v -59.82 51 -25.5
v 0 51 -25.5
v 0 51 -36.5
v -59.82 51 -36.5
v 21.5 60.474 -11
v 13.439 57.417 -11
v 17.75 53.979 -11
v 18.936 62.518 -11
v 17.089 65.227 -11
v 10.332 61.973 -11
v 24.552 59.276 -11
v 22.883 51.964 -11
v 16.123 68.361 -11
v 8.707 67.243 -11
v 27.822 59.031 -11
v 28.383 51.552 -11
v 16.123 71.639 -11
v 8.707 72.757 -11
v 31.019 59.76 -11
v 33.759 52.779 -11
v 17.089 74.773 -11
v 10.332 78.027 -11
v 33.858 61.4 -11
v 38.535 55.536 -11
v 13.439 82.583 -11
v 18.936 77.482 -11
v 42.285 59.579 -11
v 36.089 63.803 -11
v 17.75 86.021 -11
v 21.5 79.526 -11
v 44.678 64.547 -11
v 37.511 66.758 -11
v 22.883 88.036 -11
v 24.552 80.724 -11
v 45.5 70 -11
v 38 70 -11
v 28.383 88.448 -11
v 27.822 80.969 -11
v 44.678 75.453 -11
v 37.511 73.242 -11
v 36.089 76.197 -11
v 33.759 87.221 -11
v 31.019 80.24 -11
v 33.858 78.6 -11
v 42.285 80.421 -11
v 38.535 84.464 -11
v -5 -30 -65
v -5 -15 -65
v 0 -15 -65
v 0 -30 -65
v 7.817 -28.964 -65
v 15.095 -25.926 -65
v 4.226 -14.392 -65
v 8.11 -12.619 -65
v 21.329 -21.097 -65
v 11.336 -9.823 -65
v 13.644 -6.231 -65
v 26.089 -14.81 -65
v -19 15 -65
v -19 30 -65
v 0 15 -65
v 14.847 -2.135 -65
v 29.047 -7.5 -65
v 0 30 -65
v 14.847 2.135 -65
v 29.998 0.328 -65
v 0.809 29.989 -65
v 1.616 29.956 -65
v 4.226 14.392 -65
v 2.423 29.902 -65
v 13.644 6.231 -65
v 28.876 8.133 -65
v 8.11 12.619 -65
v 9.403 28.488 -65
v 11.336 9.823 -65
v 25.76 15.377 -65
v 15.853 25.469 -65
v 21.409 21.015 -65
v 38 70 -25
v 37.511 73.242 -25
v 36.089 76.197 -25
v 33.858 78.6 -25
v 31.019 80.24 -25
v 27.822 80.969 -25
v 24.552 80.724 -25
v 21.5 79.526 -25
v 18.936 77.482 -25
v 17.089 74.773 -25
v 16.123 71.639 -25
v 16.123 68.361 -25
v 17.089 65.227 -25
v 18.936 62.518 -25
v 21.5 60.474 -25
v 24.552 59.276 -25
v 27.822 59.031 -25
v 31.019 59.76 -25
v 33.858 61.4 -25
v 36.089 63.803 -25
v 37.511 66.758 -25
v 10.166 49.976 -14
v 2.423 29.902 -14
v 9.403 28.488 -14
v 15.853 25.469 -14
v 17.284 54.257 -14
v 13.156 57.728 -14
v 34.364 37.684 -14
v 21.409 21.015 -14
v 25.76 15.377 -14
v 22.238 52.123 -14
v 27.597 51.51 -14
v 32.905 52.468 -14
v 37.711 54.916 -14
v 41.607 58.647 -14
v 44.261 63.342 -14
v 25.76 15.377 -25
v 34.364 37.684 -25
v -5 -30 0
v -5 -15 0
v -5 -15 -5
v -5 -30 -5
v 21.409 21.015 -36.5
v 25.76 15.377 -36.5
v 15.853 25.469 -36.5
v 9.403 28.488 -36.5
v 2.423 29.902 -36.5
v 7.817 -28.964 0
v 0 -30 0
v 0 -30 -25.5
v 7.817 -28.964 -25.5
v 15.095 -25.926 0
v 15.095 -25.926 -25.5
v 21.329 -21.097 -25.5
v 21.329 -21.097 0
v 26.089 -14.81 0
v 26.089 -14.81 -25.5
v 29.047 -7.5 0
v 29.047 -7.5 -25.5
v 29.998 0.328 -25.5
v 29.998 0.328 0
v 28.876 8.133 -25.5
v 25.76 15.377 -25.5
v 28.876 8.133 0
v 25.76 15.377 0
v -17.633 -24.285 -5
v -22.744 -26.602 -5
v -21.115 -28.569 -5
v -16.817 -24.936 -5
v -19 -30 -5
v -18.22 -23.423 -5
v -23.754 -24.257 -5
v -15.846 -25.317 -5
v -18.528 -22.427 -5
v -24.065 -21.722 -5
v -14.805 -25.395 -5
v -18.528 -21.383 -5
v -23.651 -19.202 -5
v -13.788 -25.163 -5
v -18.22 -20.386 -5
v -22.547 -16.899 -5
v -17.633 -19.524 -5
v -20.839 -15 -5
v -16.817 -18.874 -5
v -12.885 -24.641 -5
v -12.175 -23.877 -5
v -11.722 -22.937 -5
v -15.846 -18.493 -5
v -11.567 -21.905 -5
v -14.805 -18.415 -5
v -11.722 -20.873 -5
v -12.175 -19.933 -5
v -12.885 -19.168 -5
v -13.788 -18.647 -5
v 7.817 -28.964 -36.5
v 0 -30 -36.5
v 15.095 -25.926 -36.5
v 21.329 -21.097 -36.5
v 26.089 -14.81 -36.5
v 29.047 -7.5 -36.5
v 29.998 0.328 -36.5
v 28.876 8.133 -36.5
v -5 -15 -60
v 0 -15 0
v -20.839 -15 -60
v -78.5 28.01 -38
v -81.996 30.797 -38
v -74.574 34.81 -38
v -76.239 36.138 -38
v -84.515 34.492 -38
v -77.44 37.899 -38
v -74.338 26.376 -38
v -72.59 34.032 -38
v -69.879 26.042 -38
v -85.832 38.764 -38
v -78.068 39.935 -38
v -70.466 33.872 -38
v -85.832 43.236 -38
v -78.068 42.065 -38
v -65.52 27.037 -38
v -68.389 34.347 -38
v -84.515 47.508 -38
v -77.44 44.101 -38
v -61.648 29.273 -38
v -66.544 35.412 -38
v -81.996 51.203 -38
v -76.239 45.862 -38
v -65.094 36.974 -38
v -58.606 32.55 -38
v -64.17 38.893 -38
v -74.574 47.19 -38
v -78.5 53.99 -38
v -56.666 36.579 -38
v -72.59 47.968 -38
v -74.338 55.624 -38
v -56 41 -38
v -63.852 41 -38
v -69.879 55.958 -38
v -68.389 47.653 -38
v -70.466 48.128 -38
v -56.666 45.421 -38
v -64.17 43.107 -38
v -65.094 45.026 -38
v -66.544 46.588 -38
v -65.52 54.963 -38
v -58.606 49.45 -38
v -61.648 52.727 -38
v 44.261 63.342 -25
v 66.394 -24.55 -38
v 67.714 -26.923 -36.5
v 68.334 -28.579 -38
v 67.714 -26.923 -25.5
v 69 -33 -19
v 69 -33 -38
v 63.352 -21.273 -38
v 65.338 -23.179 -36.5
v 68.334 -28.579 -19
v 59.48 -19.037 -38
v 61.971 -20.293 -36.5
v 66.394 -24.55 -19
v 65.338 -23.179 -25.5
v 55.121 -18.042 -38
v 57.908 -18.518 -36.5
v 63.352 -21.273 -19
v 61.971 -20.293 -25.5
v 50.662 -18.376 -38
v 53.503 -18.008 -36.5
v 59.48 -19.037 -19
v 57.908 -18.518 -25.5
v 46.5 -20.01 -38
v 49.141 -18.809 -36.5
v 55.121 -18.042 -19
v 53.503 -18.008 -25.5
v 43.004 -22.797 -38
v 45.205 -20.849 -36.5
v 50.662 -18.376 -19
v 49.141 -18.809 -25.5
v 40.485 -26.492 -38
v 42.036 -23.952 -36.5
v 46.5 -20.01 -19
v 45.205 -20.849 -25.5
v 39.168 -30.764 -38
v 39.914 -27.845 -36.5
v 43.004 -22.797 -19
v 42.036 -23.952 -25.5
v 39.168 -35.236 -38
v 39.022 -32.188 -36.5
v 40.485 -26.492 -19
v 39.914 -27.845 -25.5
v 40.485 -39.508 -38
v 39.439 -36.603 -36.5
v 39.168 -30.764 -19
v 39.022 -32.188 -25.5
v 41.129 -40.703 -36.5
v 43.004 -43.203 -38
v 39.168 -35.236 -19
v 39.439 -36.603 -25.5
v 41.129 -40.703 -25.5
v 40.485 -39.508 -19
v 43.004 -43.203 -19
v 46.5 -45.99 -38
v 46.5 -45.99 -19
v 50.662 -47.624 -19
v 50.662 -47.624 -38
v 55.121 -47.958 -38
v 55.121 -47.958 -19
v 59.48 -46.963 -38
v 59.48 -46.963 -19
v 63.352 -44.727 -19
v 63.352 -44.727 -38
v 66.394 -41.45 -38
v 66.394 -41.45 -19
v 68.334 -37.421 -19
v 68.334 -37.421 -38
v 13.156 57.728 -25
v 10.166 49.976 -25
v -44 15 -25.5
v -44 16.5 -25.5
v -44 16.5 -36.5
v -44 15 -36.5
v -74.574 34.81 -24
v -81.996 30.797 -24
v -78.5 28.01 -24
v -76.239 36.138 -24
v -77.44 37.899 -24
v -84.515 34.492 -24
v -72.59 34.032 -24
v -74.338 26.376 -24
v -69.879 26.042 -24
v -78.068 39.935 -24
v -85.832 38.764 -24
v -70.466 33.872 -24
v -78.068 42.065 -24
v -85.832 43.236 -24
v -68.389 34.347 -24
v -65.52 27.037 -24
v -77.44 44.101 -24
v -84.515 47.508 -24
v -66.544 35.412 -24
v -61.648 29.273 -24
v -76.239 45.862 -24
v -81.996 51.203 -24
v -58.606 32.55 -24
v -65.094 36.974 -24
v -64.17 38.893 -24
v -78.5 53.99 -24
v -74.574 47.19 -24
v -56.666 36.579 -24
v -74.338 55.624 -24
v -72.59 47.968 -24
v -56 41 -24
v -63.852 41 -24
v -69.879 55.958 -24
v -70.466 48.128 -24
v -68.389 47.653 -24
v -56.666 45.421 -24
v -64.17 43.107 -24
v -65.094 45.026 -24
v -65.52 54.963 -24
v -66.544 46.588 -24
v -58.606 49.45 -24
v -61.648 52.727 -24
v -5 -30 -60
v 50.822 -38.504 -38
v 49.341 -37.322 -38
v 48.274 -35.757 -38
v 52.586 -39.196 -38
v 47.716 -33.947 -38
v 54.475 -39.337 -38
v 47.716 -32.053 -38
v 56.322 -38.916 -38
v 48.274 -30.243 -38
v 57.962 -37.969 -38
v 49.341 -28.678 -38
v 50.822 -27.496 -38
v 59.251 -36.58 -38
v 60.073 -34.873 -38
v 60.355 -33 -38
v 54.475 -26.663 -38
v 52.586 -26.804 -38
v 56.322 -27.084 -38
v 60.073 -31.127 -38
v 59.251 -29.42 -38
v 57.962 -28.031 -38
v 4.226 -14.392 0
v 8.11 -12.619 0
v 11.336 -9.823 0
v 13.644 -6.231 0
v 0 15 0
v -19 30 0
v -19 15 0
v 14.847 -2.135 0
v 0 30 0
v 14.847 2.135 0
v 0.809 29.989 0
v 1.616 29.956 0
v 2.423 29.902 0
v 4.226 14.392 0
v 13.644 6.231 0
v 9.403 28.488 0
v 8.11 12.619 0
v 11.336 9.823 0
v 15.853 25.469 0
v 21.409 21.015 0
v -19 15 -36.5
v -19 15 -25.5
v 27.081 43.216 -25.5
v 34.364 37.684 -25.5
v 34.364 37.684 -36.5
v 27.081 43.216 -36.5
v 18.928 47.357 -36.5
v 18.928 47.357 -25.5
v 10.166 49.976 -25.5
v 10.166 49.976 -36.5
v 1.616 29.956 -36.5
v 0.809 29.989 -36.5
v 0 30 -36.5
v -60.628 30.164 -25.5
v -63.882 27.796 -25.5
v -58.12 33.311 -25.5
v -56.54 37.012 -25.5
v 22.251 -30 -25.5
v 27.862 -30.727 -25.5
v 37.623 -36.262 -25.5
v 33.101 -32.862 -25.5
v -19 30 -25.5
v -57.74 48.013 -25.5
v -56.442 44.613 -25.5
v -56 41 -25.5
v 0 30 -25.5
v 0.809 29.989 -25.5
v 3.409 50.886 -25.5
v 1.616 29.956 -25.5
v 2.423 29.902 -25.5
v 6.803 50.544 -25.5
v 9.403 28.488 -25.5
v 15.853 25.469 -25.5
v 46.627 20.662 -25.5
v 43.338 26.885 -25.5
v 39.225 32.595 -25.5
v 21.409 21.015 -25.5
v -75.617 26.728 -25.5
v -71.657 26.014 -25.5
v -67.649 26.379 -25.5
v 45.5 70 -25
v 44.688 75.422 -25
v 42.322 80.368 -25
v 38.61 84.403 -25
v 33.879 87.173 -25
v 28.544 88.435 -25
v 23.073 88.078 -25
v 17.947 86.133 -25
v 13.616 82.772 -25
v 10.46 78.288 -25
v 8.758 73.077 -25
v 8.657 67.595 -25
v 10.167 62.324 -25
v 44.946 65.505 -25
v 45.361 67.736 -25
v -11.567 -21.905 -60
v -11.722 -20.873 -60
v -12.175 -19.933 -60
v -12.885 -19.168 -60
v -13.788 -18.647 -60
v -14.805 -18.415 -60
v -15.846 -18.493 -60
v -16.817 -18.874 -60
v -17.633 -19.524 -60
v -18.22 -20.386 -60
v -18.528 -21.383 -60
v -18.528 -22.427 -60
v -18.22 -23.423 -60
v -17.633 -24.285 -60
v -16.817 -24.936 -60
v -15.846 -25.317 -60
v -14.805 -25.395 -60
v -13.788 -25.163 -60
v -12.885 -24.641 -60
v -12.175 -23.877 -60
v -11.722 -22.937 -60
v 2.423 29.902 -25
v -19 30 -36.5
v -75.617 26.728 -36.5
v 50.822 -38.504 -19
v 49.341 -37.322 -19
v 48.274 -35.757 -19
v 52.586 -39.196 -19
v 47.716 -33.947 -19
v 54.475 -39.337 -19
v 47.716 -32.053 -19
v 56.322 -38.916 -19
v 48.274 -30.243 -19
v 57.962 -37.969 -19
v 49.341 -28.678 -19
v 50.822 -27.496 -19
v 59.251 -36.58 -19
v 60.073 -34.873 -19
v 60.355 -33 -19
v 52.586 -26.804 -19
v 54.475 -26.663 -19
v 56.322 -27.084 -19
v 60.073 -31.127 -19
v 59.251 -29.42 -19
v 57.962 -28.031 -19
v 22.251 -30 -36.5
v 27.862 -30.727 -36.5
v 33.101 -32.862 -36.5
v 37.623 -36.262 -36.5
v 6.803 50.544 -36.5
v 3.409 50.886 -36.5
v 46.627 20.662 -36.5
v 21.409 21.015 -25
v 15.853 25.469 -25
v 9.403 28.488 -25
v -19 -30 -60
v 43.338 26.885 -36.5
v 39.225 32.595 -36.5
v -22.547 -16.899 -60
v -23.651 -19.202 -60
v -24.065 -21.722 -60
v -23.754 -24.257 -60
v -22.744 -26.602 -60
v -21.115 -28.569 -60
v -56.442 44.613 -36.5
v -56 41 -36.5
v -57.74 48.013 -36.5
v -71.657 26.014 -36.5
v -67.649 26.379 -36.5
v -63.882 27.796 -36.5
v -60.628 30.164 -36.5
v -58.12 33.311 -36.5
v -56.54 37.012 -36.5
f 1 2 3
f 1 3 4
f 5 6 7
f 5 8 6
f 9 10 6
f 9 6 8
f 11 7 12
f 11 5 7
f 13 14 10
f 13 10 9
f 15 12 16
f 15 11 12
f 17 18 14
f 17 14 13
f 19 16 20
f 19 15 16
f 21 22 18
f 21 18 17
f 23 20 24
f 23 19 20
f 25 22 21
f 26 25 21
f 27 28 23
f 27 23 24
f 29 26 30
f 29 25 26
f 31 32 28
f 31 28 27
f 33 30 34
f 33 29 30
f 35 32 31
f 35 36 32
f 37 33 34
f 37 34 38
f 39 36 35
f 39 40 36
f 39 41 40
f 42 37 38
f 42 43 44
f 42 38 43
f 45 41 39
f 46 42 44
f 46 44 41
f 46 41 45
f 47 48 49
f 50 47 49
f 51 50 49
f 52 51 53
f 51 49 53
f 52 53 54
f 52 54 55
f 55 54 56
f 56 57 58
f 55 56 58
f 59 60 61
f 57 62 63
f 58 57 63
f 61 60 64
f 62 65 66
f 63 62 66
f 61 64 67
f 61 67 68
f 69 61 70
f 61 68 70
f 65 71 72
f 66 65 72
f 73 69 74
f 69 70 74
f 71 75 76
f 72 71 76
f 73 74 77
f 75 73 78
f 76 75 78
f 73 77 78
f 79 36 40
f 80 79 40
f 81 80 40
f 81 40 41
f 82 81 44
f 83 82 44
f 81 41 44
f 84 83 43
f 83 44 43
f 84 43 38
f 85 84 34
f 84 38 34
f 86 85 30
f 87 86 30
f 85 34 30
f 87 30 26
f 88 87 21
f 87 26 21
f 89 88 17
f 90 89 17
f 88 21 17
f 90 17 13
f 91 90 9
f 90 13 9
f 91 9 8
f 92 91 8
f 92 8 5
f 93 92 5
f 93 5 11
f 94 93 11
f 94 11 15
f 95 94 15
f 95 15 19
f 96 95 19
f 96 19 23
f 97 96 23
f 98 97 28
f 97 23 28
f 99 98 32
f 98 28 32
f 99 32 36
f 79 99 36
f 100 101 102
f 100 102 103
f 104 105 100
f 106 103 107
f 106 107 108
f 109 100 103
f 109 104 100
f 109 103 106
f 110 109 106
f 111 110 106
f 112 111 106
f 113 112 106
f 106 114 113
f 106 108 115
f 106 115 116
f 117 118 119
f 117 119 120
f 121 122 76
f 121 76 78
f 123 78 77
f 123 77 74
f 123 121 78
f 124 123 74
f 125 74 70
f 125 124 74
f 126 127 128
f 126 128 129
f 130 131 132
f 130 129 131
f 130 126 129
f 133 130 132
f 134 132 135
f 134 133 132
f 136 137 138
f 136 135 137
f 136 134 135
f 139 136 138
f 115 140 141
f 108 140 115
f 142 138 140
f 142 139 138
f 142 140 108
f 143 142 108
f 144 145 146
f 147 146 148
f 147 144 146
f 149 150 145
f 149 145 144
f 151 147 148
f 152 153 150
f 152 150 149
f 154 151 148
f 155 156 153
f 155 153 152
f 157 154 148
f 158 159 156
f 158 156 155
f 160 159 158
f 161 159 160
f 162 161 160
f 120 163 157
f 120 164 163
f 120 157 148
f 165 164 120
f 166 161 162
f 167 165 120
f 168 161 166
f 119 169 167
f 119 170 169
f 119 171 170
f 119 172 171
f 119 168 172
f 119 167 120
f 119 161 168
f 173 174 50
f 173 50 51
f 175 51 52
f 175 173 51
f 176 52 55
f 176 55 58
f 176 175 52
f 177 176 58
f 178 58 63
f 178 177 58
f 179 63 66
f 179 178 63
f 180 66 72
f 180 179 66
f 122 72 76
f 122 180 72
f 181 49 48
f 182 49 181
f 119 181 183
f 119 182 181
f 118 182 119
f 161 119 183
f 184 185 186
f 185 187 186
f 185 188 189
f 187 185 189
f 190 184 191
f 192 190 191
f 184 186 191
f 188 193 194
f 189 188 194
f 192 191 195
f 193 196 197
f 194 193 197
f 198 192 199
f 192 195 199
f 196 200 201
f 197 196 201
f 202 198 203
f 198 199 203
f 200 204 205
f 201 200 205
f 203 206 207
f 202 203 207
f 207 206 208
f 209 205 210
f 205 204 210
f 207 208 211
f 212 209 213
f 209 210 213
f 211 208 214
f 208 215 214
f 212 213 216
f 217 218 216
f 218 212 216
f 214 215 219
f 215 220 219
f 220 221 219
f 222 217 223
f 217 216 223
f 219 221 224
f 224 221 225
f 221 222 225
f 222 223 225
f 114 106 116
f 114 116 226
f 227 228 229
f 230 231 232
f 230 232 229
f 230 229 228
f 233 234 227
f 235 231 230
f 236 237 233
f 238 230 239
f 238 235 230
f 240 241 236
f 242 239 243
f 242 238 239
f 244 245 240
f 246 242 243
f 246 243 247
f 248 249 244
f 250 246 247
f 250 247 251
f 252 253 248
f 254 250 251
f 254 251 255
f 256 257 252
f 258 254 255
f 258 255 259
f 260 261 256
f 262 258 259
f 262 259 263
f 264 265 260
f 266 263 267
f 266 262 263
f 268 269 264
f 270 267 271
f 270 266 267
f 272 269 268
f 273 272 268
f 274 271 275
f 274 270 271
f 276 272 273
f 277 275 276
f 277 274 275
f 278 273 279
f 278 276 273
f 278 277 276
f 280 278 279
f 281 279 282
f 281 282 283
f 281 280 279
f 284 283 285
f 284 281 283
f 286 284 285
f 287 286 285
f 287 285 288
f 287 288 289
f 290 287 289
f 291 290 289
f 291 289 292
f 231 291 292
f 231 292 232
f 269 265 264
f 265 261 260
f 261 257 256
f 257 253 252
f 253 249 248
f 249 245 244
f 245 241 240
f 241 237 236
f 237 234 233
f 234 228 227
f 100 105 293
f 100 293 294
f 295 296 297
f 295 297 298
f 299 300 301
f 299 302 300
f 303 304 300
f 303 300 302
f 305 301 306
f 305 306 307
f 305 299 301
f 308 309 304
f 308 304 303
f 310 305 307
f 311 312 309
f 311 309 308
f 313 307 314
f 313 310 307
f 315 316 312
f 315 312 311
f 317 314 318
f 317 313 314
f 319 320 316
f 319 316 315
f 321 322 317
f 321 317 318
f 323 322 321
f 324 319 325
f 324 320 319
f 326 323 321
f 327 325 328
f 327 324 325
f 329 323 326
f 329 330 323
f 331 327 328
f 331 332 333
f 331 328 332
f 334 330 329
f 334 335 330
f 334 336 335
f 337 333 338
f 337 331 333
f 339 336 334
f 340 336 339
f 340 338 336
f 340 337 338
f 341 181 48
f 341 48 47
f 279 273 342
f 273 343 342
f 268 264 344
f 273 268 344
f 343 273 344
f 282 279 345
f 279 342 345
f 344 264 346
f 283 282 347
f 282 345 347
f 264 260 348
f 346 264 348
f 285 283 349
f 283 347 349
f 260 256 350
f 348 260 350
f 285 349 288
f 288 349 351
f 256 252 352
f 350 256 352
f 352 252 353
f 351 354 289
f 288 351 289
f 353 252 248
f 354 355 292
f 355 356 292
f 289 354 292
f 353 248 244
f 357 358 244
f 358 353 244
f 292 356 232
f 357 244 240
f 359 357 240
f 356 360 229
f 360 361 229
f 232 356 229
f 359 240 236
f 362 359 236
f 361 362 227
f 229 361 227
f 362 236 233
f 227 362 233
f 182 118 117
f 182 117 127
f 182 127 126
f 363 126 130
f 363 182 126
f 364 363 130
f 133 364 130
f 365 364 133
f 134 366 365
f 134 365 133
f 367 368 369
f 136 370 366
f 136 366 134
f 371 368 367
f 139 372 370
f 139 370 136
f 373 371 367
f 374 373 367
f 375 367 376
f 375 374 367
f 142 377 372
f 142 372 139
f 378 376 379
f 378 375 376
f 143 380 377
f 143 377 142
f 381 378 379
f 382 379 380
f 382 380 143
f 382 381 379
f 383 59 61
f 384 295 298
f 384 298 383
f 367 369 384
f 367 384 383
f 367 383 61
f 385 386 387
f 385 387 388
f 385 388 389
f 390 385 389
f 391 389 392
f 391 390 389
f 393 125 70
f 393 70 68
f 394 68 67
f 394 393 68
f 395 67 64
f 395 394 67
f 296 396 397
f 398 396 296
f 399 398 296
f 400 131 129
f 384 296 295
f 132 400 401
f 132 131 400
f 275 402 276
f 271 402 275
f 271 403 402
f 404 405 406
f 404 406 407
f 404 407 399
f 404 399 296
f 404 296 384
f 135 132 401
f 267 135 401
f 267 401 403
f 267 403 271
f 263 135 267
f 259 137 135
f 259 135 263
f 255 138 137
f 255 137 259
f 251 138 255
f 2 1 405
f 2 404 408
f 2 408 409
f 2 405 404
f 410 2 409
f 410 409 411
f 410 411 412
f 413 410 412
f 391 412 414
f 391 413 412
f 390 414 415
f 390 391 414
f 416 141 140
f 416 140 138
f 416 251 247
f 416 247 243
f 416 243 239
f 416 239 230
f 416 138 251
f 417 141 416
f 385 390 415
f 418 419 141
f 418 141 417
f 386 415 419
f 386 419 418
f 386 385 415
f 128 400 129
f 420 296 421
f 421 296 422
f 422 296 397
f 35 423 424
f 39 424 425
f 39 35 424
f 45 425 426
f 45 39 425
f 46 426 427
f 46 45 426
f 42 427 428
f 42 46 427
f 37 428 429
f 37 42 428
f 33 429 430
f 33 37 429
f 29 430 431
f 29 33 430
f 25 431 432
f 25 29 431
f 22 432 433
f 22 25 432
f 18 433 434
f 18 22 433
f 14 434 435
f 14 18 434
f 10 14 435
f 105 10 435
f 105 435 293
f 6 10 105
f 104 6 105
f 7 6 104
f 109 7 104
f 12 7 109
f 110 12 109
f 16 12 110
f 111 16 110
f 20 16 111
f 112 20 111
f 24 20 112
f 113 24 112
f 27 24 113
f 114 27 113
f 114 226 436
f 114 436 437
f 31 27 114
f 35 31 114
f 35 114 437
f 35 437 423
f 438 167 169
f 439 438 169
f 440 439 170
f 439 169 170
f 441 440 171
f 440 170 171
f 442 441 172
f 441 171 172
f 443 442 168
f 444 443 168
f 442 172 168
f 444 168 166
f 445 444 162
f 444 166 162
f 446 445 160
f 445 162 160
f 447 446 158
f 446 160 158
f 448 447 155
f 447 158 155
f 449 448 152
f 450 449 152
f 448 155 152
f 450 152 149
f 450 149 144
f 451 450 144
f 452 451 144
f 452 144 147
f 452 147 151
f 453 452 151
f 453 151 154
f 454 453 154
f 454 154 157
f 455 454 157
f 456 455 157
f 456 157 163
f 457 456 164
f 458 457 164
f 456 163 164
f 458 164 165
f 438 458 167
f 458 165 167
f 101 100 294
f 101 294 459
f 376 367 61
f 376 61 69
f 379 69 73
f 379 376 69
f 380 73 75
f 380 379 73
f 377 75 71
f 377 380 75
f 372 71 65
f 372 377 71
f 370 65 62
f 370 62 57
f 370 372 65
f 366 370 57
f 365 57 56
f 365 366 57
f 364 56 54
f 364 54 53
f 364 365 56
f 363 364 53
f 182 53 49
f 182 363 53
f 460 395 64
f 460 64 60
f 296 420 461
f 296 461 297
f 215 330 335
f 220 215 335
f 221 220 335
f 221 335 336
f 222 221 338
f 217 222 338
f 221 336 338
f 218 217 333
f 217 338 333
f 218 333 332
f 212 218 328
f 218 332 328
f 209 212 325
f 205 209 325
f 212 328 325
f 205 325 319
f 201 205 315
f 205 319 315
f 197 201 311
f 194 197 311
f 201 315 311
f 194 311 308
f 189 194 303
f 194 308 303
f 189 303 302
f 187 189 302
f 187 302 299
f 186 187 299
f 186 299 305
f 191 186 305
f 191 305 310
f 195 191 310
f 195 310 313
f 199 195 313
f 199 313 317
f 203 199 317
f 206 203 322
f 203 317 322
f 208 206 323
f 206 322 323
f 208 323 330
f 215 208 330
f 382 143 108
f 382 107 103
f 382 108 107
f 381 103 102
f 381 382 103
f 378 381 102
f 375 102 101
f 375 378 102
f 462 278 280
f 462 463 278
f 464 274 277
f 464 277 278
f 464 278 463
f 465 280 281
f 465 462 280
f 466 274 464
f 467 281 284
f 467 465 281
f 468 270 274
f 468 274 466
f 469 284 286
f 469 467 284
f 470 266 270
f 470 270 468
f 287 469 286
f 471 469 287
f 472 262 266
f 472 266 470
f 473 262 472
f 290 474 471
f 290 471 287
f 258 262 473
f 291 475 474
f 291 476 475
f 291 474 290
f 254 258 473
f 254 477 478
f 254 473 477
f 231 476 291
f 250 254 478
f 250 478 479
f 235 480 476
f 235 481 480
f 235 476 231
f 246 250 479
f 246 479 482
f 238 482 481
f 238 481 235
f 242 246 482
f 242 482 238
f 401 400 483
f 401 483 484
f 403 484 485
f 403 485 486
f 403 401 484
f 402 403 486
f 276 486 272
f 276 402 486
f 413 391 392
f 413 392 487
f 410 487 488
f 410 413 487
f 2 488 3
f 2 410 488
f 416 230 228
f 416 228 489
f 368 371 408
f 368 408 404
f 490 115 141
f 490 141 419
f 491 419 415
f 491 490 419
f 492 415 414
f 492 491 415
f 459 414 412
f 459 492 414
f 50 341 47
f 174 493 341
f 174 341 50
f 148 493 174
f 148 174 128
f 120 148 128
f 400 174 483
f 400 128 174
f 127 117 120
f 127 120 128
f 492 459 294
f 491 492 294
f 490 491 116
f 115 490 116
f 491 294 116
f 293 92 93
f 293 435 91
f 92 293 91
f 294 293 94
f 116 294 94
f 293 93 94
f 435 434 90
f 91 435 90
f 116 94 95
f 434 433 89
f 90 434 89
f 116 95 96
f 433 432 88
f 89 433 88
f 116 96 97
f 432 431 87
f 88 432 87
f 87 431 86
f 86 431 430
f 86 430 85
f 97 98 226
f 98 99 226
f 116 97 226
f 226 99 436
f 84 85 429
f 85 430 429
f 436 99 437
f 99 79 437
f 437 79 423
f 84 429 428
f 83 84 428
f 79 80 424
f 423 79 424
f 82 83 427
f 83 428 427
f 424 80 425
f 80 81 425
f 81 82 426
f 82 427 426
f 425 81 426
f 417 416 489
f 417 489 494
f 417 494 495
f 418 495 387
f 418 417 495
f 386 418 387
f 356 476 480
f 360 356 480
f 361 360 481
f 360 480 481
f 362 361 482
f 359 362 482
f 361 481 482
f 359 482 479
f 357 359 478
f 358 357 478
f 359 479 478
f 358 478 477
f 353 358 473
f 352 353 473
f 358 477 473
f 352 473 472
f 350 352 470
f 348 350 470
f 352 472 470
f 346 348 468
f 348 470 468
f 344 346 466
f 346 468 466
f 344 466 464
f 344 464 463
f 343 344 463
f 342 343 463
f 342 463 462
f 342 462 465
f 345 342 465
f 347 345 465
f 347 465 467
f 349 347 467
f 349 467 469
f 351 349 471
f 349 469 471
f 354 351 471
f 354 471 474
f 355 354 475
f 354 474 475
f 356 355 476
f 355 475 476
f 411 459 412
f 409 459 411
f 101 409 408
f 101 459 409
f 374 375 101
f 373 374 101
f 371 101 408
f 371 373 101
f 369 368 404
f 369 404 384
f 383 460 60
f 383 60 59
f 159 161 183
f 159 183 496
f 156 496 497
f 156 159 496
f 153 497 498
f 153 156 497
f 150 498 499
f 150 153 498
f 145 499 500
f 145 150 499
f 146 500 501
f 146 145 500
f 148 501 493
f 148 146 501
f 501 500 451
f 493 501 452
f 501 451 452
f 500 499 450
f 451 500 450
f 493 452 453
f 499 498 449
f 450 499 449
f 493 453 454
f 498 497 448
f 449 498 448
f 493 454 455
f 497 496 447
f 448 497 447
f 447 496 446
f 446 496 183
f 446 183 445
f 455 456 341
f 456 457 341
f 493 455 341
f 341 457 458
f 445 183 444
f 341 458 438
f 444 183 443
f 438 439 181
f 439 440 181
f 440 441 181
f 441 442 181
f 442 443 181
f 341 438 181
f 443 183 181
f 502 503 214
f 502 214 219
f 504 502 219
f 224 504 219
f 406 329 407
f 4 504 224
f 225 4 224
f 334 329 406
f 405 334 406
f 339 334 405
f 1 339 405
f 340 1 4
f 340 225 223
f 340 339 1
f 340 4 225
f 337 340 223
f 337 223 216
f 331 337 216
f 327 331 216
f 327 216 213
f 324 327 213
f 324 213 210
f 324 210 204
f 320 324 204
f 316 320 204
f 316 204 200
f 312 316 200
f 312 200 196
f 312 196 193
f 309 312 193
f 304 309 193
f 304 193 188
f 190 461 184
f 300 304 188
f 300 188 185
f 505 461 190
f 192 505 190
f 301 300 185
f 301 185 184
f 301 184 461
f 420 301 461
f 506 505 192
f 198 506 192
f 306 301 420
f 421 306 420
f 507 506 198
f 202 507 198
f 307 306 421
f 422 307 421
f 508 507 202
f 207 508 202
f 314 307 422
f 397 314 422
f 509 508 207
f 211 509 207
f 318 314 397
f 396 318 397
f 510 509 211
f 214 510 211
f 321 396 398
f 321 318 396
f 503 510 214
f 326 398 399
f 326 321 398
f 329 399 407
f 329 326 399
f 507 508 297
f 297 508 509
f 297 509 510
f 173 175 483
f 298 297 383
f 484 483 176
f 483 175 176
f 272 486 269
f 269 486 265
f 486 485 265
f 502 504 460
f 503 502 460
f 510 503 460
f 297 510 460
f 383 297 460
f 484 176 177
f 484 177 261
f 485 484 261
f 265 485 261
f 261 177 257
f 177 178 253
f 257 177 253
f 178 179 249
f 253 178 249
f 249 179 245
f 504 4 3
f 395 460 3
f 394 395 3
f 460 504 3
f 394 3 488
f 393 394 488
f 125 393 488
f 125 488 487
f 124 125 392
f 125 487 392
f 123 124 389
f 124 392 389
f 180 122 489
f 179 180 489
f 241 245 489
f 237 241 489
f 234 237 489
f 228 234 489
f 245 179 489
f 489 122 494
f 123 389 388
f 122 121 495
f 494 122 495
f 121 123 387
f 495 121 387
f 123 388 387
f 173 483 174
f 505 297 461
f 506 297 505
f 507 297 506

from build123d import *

# Parameters (mm, degrees)
BOSS_EXTRUDE1_DEPTH = 65
BOSS_EXTRUDE2_START = -11
SKETCH1_4_R         = 11
BOSS_EXTRUDE2_DEPTH = 14
BOSS_EXTRUDE3_START = -19
SKETCH1_5_R         = 6.355
BOSS_EXTRUDE3_DEPTH = 19
BOSS_EXTRUDE4_START = -24
SKETCH1_6_R         = 7.1475
BOSS_EXTRUDE4_DEPTH = 14
BOSS_EXTRUDE5_START = -25.5
BOSS_EXTRUDE5_DEPTH = 11
BOSS_EXTRUDE6_START = -25.5
BOSS_EXTRUDE6_DEPTH = 11
BOSS_EXTRUDE8_START = -14
BOSS_EXTRUDE8_DEPTH = 11
BOSS_EXTRUDE9_START = -5
SKETCH1_11_R        = 3.5
BOSS_EXTRUDE9_DEPTH = 55


with BuildPart() as part:
    # Sketch1 → Boss-Extrude1 (new body)
    with BuildSketch(Plane.XY):
        with BuildLine():
            ThreePointArc((2.423237338, 29.901971855), (1.212609656, 29.975482946), (0, 30))
            Line((0, 30), (-19, 30))
            Line((-19, 30), (-19, 15))
            Line((-19, 15), (0, 15))
            ThreePointArc((0, 15), (15, 0), (0, -15))
            Line((0, -15), (-5, -15))
            Line((-5, -15), (-5, -30))
            Line((-5, -30), (0, -30))
            ThreePointArc((0, -30), (26.089312829, -14.810393516), (25.759532638, 15.376816259))
            ThreePointArc((25.759532638, 15.376816259), (15.852828365, 25.469350852), (2.423237338, 29.901971855))
        make_face()
    extrude(amount=-BOSS_EXTRUDE1_DEPTH)



with BuildPart() as body_2:
    # Sketch1<4> → Boss-Extrude2 (new body)
    with BuildSketch(Plane.XY.offset(BOSS_EXTRUDE2_START)):
        with BuildLine():
            ThreePointArc((45.5, 70), (20.437248607, 87.29682902), (13.156184416, 57.728130946))
            ThreePointArc((13.156184416, 57.728130946), (30.286091355, 51.794187642), (44.26053068, 63.342366738))
            ThreePointArc((44.26053068, 63.342366738), (45.187493197, 66.61398594), (45.5, 70))
        make_face()
        with Locations((27, 70)):
            Circle(SKETCH1_4_R, mode=Mode.SUBTRACT)
    extrude(amount=-BOSS_EXTRUDE2_DEPTH)


with BuildPart() as body_3:
    # Sketch1<5> → Boss-Extrude3 (new body)
    with BuildSketch(Plane.XY.offset(BOSS_EXTRUDE3_START)):
        with BuildLine():
            ThreePointArc((69, -33), (68.674928752, -29.894123935), (67.713804516, -26.922865338))
            ThreePointArc((67.713804516, -26.922865338), (47.097213206, -19.682660383), (41.128777406, -40.702702703))
            ThreePointArc((41.128777406, -40.702702703), (57.995726535, -47.458014022), (69, -33))
        make_face()
        with Locations((54, -33)):
            Circle(SKETCH1_5_R, mode=Mode.SUBTRACT)
    extrude(amount=-BOSS_EXTRUDE3_DEPTH)


with BuildPart() as body_4:
    # Sketch1<6> → Boss-Extrude4 (new body)
    with BuildSketch(Plane.XY.offset(BOSS_EXTRUDE4_START)):
        with BuildLine():
            ThreePointArc((-56, 41), (-56.987414616, 46.352331347), (-59.819660113, 51))
            ThreePointArc((-59.819660113, 51), (-83.571760681, 49.182348891), (-75.616979166, 26.728227041))
            ThreePointArc((-75.616979166, 26.728227041), (-62.175451499, 28.870393916), (-56, 41))
        make_face()
        with Locations((-71, 41)):
            Circle(SKETCH1_6_R, mode=Mode.SUBTRACT)
    extrude(amount=-BOSS_EXTRUDE4_DEPTH)


with BuildPart() as part_1:
    add(part.part)

    add(body_4.part)  # Boss-Extrude5 merges body 4
    # Sketch1<7> → Boss-Extrude5 (add)
    with BuildSketch(Plane.XY.offset(BOSS_EXTRUDE5_START)):
        with BuildLine():
            Line((-19, 30), (0, 30))
            ThreePointArc((0, 30), (1.212609656, 29.975482946), (2.423237338, 29.901971855))
            Line((2.423237338, 29.901971855), (10.166256776, 49.976466693))
            ThreePointArc((10.166256776, 49.976466693), (5.10882563, 50.743471508), (0, 51))
            Line((0, 51), (-59.819660113, 51))
            ThreePointArc((-59.819660113, 51), (-56.987414616, 46.352331347), (-56, 41))
            ThreePointArc((-56, 41), (-62.175451499, 28.870393916), (-75.616979166, 26.728227041))
            Line((-75.616979166, 26.728227041), (-44, 16.5))
            Line((-44, 16.5), (-44, 15))
            Line((-44, 15), (-19, 15))
            Line((-19, 15), (-19, 30))
        make_face()
    extrude(amount=-BOSS_EXTRUDE5_DEPTH)


    add(body_3.part)  # Boss-Extrude6 merges body 3
    # Sketch1<8> → Boss-Extrude6 (add)
    with BuildSketch(Plane.XY.offset(BOSS_EXTRUDE6_START)):
        with BuildLine():
            Line((10.166256776, 49.976466693), (2.423237338, 29.901971855))
            ThreePointArc((2.423237338, 29.901971855), (29.975482946, -1.212609656), (0, -30))
            Line((0, -30), (22.250984267, -30))
            ThreePointArc((22.250984267, -30), (33.101317429, -32.861811207), (41.128777406, -40.702702703))
            ThreePointArc((41.128777406, -40.702702703), (47.097213206, -19.682660383), (67.713804516, -26.922865338))
            Line((67.713804516, -26.922865338), (46.626935354, 20.662257852))
            ThreePointArc((46.626935354, 20.662257852), (31.956179028, 39.746730959), (10.166256776, 49.976466693))
        make_face()
    extrude(amount=-BOSS_EXTRUDE6_DEPTH)


    add(body_2.part)  # Boss-Extrude8 merges body 2
    # Sketch1<9> → Boss-Extrude8 (add)
    with BuildSketch(Plane.XY.offset(BOSS_EXTRUDE8_START)):
        with BuildLine():
            ThreePointArc((2.423237338, 29.901971855), (15.852828365, 25.469350852), (25.759532638, 15.376816259))
            Line((25.759532638, 15.376816259), (44.26053068, 63.342366738))
            ThreePointArc((44.26053068, 63.342366738), (30.286091355, 51.794187642), (13.156184416, 57.728130946))
            Line((13.156184416, 57.728130946), (2.423237338, 29.901971855))
        make_face()
    extrude(amount=-BOSS_EXTRUDE8_DEPTH)

    # Sketch1<11> → Boss-Extrude9 (add)
    with BuildSketch(Plane.XY.offset(BOSS_EXTRUDE9_START)):
        with BuildLine():
            Line((-19, -30), (-5, -30))
            Line((-5, -30), (-5, -15))
            Line((-5, -15), (-20.839490527, -15))
            ThreePointArc((-20.839490527, -15), (-24, -23.000372662), (-19, -30))
        make_face()
        with Locations((-15.066920643, -21.904885006)):
            Circle(SKETCH1_11_R, mode=Mode.SUBTRACT)
    extrude(amount=-BOSS_EXTRUDE9_DEPTH)


solid = part_1.part
